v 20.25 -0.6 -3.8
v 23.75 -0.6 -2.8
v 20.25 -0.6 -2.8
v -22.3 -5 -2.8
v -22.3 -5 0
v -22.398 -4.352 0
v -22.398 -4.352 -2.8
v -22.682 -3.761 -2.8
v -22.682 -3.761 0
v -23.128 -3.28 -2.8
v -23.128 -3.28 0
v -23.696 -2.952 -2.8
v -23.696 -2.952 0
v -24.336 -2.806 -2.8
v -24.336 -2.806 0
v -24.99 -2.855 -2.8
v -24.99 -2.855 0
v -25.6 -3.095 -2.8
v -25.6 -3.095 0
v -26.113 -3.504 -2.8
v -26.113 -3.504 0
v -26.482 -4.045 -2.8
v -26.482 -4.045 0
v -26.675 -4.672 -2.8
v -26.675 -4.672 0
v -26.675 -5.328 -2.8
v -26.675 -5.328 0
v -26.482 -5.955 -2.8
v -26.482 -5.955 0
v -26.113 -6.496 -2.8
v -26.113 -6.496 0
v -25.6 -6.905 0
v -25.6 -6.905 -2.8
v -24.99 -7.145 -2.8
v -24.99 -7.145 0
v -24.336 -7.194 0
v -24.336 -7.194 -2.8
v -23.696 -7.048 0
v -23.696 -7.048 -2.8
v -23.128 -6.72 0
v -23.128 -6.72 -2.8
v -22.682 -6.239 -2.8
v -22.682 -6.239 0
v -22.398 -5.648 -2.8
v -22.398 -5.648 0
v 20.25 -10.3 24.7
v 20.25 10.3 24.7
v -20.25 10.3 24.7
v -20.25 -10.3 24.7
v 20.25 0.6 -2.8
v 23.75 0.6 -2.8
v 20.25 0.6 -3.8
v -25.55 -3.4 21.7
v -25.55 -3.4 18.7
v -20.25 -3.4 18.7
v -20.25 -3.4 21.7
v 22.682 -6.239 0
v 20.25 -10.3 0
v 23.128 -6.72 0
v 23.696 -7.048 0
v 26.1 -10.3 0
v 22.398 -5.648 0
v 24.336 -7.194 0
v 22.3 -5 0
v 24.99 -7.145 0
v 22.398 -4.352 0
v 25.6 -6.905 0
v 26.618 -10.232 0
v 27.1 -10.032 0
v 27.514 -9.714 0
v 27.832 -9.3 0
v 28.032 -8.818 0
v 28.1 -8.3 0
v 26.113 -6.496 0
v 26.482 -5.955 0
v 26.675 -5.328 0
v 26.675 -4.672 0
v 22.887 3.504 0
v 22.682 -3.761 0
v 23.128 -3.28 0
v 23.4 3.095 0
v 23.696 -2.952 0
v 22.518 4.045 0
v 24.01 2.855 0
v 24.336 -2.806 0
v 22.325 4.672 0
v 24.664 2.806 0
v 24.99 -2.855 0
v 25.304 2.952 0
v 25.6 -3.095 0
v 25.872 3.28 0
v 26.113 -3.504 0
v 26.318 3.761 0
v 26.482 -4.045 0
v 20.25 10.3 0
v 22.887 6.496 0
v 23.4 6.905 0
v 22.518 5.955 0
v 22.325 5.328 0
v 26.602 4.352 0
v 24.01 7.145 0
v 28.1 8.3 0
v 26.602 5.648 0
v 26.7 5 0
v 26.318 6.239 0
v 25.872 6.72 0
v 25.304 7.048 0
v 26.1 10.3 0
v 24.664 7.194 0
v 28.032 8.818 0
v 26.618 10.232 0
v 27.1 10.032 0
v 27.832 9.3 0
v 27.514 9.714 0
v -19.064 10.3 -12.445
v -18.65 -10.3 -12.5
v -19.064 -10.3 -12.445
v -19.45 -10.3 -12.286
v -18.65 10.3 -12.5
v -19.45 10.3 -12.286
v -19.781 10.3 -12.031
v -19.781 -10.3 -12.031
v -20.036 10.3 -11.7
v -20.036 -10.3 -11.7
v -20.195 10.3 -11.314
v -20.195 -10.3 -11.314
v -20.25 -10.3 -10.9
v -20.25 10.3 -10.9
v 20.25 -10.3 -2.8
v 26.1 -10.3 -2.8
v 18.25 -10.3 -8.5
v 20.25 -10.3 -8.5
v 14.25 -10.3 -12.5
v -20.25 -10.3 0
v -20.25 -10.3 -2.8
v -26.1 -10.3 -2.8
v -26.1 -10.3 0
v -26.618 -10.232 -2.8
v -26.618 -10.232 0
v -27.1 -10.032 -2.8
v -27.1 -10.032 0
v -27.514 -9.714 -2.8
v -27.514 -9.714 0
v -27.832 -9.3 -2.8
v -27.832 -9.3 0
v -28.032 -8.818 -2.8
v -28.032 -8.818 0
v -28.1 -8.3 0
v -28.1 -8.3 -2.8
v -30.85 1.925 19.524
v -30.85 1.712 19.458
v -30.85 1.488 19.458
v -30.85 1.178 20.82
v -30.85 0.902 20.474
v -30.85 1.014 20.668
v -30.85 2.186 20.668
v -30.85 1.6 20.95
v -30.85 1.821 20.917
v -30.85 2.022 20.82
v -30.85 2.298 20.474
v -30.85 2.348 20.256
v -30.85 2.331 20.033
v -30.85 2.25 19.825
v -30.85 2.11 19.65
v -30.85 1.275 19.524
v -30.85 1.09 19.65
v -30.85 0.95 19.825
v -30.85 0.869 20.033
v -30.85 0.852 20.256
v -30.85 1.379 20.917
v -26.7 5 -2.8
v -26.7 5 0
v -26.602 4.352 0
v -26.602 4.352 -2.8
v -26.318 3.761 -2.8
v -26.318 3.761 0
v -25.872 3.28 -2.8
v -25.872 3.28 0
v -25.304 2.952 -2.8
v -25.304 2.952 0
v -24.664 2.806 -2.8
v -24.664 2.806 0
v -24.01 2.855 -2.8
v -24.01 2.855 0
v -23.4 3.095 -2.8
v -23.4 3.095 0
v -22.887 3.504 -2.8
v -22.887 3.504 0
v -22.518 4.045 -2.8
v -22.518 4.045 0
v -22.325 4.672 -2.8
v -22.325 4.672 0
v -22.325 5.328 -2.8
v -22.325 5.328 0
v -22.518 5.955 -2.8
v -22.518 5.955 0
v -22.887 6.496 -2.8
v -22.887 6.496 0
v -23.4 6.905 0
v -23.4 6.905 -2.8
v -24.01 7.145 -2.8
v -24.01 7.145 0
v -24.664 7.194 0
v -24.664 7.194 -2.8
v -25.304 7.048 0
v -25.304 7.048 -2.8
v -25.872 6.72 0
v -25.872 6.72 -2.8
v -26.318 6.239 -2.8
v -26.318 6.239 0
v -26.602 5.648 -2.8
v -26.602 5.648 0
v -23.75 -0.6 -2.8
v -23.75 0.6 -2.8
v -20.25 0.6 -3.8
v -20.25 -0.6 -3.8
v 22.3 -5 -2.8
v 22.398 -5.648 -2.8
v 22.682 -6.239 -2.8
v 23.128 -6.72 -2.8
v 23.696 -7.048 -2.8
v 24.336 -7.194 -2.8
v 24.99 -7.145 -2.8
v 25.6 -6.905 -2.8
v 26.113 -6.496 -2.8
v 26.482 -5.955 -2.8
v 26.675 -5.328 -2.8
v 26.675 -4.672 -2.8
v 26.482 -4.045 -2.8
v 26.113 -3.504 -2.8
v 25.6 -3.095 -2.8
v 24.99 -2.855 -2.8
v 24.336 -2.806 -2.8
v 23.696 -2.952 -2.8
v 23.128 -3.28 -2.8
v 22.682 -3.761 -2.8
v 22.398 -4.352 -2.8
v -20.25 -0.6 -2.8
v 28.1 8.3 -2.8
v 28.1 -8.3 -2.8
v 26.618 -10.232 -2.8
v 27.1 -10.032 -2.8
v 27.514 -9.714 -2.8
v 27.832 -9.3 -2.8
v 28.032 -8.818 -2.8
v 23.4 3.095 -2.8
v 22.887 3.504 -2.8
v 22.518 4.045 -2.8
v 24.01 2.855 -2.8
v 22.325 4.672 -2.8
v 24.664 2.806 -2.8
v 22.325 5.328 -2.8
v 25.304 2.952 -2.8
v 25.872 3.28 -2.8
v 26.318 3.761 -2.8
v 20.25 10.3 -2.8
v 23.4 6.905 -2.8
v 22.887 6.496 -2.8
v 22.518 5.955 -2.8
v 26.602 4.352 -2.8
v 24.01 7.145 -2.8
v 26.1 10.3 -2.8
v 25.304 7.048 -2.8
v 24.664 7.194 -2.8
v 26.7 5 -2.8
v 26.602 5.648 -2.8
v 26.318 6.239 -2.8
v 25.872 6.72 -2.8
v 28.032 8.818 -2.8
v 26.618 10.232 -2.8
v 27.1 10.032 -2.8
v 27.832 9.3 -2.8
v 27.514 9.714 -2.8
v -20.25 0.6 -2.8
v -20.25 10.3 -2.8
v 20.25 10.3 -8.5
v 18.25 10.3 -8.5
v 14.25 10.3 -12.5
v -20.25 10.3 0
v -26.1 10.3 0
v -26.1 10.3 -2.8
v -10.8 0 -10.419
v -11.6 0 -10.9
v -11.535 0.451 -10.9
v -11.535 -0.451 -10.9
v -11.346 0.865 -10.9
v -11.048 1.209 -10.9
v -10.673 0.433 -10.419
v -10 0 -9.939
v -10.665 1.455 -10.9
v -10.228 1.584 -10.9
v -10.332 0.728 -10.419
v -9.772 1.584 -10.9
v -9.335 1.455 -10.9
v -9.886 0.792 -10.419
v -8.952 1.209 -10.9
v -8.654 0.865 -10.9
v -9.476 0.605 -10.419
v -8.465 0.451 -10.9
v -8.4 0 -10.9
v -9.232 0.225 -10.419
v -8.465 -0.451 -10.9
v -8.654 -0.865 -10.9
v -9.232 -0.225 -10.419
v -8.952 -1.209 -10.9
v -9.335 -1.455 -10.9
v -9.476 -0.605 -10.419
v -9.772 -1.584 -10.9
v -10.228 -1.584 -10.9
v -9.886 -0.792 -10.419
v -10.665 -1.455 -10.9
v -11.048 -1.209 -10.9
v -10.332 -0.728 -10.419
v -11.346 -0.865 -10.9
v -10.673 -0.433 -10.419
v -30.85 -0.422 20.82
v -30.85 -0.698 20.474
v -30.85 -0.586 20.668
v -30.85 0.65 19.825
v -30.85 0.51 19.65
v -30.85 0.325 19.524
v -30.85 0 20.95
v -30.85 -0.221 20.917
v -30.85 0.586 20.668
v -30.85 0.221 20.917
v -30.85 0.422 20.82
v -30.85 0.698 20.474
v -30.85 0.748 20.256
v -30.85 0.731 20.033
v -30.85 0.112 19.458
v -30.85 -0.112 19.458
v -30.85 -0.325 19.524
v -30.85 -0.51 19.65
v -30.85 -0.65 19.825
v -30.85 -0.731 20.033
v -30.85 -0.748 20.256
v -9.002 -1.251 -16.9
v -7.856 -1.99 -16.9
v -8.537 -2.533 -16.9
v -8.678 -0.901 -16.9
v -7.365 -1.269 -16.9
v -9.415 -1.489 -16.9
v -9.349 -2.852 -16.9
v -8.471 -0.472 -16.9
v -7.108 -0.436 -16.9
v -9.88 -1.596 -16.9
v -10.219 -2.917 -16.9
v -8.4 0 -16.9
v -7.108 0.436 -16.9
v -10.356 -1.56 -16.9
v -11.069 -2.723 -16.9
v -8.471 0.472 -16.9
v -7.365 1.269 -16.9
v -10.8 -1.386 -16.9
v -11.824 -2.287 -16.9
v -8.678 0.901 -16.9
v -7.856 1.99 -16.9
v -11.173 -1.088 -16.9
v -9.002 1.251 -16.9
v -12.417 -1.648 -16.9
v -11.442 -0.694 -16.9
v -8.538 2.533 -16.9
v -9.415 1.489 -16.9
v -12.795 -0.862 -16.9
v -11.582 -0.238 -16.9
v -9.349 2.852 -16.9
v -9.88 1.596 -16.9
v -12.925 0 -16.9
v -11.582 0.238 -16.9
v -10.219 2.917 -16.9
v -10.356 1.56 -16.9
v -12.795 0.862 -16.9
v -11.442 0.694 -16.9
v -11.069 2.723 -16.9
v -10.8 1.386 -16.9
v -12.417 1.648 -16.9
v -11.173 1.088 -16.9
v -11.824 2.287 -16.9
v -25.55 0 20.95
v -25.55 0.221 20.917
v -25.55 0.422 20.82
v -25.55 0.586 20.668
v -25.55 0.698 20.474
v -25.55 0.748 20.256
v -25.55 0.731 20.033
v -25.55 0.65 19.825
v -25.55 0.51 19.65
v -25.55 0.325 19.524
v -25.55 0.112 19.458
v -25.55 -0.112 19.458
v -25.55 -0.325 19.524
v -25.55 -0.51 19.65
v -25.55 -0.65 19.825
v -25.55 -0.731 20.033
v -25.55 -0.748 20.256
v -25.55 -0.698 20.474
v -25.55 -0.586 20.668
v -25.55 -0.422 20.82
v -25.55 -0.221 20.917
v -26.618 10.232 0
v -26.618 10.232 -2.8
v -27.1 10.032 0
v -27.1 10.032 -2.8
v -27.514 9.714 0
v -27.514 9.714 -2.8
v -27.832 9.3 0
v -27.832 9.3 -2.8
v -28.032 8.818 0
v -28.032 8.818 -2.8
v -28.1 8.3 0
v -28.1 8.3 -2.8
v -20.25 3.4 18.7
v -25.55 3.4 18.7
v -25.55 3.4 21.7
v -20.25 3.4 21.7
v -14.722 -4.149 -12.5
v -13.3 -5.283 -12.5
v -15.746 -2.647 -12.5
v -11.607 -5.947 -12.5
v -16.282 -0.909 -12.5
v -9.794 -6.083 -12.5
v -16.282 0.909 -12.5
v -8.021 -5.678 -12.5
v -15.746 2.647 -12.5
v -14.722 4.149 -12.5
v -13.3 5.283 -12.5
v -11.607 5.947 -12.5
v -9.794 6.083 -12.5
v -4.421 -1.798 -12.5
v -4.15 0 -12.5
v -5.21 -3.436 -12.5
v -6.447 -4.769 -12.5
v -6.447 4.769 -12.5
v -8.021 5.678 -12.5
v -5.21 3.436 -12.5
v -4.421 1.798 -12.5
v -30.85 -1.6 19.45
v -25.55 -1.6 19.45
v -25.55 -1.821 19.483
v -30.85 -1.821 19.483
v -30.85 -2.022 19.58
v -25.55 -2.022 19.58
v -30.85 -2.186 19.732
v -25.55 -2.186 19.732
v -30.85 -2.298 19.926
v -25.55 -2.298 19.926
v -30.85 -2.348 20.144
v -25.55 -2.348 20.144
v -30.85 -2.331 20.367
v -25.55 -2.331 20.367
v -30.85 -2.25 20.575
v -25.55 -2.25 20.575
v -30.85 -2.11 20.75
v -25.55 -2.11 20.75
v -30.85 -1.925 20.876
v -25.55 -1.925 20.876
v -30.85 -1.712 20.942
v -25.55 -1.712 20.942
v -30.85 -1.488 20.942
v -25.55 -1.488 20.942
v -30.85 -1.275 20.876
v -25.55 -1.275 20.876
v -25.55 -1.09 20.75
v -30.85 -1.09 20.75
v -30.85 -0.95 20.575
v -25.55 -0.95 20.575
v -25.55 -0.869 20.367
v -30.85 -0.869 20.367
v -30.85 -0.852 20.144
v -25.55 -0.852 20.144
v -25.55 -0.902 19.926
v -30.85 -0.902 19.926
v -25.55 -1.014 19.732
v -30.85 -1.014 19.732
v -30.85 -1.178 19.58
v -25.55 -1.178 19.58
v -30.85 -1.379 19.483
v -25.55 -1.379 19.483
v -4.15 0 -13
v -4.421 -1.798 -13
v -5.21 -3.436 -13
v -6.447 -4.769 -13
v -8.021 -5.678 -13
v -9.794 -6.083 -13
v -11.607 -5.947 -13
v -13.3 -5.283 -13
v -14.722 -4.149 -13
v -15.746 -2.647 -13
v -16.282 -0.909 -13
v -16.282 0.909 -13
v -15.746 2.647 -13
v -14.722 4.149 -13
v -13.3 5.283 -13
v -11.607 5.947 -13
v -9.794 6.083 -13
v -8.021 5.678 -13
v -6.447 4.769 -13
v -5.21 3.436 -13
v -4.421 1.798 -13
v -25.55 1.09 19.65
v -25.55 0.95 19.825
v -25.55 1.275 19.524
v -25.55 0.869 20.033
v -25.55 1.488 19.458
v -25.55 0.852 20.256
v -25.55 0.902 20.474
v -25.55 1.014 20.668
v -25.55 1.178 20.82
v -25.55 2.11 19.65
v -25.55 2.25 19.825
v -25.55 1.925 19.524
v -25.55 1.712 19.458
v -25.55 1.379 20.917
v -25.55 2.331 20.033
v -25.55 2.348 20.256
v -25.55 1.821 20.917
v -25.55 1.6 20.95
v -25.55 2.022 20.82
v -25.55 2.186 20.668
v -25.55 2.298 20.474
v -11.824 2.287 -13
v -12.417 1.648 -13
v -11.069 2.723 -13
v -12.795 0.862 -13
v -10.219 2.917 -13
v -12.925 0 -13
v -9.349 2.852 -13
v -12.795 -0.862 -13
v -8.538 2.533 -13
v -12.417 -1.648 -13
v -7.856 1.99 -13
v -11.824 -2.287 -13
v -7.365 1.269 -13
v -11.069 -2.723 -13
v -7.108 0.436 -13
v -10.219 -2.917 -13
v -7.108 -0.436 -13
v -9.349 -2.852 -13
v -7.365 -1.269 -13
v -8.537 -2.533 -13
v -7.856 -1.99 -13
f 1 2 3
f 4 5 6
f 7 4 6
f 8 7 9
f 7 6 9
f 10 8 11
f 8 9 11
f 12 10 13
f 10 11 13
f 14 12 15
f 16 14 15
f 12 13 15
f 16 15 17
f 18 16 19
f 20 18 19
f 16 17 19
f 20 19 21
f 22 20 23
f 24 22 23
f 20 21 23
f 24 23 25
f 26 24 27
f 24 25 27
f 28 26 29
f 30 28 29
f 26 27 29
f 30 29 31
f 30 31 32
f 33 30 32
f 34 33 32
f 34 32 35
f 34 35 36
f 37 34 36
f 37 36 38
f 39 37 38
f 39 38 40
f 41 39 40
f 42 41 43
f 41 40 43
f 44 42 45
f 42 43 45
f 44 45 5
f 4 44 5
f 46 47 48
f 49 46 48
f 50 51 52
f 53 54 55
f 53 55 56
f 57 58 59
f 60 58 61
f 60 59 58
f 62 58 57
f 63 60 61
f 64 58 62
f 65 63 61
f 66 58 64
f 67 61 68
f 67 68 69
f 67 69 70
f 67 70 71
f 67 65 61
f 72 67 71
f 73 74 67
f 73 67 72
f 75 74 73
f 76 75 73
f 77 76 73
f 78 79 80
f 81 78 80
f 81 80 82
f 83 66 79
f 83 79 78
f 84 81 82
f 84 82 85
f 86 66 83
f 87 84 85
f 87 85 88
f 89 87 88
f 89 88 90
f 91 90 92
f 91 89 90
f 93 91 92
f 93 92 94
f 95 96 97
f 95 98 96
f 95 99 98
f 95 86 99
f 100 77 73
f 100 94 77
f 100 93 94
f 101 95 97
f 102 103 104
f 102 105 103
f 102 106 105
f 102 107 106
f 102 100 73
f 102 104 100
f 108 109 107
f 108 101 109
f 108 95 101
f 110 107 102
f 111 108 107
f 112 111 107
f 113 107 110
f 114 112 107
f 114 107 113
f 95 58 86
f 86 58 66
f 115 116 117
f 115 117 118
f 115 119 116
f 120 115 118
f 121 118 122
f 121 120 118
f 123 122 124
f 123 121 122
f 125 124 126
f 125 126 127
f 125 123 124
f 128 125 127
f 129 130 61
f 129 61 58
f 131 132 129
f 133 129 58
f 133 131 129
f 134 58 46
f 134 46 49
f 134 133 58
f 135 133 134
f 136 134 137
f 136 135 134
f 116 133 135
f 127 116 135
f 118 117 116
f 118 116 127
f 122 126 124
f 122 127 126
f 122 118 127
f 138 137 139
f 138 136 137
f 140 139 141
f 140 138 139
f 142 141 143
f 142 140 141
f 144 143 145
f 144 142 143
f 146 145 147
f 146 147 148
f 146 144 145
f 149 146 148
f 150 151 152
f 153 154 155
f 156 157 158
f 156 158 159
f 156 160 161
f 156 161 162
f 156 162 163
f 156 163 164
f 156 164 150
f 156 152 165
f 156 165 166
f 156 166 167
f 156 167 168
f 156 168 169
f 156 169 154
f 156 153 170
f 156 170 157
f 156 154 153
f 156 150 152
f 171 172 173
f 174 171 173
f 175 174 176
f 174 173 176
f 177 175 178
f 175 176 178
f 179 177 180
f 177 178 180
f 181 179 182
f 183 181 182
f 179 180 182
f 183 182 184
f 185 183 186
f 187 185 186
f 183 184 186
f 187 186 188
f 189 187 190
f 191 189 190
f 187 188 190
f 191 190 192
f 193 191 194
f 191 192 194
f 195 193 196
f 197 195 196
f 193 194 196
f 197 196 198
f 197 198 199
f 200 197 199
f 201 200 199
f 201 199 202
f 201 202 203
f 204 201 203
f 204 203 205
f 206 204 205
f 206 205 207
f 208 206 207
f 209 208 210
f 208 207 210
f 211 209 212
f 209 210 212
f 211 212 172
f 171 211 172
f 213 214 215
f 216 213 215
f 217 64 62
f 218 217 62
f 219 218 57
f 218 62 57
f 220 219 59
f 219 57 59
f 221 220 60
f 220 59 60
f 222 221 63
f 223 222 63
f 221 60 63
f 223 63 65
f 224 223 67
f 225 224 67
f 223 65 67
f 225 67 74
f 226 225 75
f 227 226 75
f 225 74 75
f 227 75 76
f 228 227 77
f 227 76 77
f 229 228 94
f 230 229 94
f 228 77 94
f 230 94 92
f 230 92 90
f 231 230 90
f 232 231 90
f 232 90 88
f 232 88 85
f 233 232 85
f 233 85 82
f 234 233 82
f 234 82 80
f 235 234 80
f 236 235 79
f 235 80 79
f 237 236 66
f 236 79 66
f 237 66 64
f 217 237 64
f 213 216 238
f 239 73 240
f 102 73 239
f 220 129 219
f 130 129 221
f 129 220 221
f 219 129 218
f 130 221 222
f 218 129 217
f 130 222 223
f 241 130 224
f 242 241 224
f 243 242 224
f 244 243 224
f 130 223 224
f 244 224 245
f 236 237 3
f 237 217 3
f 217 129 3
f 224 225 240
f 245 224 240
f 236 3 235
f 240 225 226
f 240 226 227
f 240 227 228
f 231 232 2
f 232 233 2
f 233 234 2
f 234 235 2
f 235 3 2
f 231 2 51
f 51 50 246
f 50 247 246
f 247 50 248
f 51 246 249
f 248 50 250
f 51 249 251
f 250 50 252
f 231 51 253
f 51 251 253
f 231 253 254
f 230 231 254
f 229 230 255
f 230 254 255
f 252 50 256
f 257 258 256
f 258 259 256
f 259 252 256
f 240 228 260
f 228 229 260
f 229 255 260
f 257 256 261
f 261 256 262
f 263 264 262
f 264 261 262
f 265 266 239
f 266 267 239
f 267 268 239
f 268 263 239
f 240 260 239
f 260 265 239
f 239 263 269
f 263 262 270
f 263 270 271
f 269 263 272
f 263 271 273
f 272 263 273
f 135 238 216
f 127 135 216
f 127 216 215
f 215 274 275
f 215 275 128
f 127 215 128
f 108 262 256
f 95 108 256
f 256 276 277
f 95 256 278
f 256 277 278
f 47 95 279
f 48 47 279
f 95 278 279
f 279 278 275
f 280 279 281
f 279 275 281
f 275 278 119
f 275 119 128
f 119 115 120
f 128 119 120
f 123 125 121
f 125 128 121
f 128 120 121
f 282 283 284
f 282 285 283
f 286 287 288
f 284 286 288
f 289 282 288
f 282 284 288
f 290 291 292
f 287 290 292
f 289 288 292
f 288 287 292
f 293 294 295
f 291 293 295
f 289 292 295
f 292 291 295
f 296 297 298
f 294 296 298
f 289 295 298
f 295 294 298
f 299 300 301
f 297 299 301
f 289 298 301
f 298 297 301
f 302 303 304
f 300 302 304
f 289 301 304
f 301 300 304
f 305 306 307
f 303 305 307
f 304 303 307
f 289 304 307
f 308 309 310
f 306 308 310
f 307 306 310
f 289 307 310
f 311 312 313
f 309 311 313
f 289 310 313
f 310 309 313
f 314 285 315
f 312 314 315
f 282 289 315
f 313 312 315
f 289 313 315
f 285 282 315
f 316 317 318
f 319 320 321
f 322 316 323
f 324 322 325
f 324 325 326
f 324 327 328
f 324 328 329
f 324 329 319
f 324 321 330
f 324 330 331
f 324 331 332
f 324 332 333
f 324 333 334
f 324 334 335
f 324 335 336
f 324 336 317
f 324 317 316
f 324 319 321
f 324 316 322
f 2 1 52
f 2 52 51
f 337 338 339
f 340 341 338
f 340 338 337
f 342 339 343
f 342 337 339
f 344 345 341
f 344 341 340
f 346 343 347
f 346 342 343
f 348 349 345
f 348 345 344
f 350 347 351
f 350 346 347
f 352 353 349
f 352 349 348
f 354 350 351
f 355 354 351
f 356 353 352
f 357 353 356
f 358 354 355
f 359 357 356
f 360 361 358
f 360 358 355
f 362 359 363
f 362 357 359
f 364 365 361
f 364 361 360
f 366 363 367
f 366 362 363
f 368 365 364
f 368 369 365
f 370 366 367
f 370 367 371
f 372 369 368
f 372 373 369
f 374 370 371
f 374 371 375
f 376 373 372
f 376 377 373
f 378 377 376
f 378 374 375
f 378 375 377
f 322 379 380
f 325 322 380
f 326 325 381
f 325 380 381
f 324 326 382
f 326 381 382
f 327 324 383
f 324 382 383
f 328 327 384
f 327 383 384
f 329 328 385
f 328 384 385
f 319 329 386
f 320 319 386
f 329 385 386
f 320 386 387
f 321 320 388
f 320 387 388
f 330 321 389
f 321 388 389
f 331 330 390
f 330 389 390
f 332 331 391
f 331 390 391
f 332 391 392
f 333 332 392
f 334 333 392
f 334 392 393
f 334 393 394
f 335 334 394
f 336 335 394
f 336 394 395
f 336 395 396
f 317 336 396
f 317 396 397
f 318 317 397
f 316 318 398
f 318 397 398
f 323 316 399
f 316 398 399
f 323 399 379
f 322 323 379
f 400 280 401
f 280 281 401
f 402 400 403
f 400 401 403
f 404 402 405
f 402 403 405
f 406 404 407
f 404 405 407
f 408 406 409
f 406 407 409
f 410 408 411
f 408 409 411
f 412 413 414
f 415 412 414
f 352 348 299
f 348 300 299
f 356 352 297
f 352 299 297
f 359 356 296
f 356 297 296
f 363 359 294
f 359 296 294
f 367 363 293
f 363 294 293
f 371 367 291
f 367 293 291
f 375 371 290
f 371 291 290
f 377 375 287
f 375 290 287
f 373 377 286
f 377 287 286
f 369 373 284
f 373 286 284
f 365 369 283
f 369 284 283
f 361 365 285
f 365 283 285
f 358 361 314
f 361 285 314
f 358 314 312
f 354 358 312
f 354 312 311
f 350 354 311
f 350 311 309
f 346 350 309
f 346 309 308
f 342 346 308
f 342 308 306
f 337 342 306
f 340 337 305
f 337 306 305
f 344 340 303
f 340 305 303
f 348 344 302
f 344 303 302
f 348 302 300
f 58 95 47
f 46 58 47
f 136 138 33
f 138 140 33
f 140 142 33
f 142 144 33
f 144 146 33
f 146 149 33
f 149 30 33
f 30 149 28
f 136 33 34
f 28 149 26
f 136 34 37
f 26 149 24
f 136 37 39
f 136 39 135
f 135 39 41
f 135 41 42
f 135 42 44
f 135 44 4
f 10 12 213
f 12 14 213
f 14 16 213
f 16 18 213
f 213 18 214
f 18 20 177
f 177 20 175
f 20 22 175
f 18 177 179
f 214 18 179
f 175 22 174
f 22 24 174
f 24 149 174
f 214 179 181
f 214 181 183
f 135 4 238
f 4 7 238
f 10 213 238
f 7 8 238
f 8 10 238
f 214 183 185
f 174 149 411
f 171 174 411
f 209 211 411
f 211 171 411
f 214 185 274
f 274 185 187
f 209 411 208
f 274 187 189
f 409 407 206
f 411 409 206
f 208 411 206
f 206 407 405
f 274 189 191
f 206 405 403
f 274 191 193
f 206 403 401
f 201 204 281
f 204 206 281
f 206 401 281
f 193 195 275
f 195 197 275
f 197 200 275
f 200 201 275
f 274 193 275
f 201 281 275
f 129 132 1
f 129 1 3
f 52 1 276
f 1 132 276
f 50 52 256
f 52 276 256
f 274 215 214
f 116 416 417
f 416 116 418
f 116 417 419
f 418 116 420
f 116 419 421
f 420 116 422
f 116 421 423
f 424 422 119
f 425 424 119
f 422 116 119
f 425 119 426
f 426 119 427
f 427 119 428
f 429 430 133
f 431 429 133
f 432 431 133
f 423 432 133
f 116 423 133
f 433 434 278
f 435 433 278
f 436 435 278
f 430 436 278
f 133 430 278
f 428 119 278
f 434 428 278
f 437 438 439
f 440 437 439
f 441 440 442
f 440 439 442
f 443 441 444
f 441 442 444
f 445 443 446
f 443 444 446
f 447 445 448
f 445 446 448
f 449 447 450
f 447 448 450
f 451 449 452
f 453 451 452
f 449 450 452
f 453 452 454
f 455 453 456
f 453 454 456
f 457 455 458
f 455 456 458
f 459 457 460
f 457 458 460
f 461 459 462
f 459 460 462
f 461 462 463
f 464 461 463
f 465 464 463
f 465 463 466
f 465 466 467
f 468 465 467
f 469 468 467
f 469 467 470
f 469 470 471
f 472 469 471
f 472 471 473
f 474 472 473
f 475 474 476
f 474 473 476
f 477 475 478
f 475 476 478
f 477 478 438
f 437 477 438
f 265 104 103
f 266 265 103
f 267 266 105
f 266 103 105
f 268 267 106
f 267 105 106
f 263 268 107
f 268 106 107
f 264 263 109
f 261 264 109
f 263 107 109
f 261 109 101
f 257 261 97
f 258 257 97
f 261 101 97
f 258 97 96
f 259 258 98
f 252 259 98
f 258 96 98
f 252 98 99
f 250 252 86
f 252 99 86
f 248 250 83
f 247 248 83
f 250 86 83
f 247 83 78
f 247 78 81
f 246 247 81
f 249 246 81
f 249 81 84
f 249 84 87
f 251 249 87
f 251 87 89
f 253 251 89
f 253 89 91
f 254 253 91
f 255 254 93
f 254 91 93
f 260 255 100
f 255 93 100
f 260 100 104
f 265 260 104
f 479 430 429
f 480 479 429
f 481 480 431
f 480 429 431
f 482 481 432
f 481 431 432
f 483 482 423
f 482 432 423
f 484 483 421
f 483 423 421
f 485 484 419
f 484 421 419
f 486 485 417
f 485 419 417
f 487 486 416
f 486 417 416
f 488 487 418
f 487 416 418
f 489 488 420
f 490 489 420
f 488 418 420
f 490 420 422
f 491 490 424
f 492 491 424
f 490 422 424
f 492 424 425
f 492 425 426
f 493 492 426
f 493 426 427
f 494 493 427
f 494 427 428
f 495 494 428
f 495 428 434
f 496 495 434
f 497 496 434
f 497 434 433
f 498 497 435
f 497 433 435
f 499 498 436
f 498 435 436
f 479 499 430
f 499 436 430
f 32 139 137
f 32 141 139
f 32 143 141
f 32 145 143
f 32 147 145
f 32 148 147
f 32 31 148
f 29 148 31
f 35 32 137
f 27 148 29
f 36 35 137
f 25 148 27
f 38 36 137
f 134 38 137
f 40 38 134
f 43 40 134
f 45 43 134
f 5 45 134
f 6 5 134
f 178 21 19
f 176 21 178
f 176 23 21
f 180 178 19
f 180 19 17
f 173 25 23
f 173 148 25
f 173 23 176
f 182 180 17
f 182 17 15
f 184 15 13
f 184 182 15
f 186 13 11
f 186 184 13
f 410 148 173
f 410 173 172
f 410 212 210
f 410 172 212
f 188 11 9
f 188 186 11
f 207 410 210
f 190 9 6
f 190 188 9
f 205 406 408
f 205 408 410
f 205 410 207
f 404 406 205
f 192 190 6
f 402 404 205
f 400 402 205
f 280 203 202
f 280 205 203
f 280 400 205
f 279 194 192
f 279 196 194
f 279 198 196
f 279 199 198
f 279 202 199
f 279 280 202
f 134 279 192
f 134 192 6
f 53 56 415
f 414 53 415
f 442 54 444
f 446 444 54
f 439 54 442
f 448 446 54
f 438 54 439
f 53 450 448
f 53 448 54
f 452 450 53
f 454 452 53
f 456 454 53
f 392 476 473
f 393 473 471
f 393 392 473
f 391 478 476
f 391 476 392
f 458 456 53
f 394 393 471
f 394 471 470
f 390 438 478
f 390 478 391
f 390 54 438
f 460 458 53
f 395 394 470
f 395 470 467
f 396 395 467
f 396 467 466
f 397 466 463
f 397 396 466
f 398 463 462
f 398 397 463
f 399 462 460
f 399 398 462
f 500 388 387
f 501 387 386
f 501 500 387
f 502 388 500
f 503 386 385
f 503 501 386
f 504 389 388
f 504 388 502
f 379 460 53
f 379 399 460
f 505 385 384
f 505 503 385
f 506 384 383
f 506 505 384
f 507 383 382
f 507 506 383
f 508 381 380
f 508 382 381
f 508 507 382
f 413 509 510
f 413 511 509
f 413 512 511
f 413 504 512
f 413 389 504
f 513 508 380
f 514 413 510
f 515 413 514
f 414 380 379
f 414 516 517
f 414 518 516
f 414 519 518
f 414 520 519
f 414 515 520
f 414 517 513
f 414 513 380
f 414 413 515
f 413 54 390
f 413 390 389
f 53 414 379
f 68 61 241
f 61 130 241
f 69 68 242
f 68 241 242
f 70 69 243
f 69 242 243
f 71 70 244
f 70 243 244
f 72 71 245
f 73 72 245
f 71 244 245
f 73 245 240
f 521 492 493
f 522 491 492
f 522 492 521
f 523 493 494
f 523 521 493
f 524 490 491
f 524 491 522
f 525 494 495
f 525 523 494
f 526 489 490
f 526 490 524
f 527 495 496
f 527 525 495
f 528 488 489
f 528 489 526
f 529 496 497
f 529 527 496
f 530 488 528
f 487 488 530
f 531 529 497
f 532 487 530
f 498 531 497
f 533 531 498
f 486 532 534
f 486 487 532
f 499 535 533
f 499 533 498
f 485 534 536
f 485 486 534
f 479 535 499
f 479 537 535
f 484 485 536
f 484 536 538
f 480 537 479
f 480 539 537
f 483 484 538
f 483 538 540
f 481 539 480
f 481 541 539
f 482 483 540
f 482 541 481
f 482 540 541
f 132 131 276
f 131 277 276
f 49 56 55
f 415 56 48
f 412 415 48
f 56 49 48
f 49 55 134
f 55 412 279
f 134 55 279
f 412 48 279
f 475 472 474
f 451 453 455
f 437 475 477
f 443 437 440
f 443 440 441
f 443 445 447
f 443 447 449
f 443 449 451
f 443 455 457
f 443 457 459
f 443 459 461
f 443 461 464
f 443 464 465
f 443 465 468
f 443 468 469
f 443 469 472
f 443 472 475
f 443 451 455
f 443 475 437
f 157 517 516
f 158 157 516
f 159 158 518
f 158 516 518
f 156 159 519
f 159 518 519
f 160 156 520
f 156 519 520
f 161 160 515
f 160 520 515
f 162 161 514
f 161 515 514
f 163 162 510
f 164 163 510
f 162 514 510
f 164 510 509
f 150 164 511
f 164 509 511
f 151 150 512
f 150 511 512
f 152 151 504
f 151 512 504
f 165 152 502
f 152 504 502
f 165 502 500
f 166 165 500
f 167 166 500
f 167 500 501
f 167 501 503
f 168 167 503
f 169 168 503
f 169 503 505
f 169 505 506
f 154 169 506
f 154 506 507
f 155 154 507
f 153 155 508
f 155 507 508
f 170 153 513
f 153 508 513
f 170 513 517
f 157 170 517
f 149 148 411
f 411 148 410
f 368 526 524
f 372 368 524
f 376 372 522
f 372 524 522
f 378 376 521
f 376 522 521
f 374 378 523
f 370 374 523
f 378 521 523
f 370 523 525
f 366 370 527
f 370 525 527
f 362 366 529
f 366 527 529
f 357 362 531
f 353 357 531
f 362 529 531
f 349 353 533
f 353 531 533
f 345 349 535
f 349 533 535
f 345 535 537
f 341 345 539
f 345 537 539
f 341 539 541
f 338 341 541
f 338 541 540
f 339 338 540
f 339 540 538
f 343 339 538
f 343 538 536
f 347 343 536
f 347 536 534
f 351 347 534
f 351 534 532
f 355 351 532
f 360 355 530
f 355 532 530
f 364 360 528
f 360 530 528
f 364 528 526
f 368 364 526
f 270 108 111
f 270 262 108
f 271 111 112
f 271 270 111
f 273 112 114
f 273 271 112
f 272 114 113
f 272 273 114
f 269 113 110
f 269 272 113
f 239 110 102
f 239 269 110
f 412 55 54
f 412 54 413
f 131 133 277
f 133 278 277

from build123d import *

# Parameters (mm, degrees)
BOSS_EXTRU_1_DEPTH   = 10.3
ESQUISSE3_W          = 7.85
ESQUISSE3_H          = 20.6
ESQUISSE3_R          = 2.2
BOSS_EXTRU_2_DEPTH   = 2.8
BOSS_EXTRU_3_DEPTH   = 0.6
ESQUISSE8_R          = 6.1
BOSS_EXTRU_7_DEPTH   = 0.5
ESQUISSE5_R          = 2.925
BOSS_EXTRU_4_DEPTH   = 3.9
CONG_1_R             = 2
ESQUISSE6_W          = 3
ESQUISSE6_H          = 6.8
BOSS_EXTRU_5_DEPTH   = 5.3
ESQUISSE7_R          = 0.75
BOSS_EXTRU_6_DEPTH   = 5.3
D_GAGEMENT_M31_D     = 3.2
D_GAGEMENT_M31_DEPTH = 6
D_GAGEMENT_M31_TIP   = 0.96137699
CONG_2_R             = 1.6


with BuildPart() as part:
    # Esquisse1 → Boss.-Extru.1 (new, symmetric)
    with BuildSketch(Plane(origin=(0, 0, 0), x_dir=(1, 0, 0), z_dir=(0, 1, 0))):
        Polygon((-20.25, 12.5), (14.25, 12.5), (18.25, 8.5), (20.25, 8.5), (20.25, -24.7), (-20.25, -24.7), align=None)
    extrude(amount=BOSS_EXTRU_1_DEPTH, both=True)

    # Esquisse3 → Boss.-Extru.2 (add)
    # profile 1 of 2: a face of its own
    with BuildSketch(Plane.XY):
        with Locations((24.175, 0)):
            Rectangle(ESQUISSE3_W, ESQUISSE3_H)
        with Locations((24.5, 5)):
            Circle(ESQUISSE3_R, mode=Mode.SUBTRACT)
        with Locations(Location((24.5, -5, 0), (0, 0, 180))):
            Circle(ESQUISSE3_R, mode=Mode.SUBTRACT)
    # profile 2 of 2: a face of its own
    with BuildSketch(Plane.XY):
        with Locations((-24.175, 0)):
            Rectangle(ESQUISSE3_W, ESQUISSE3_H)
        with Locations(Location((-24.5, 5, 0), (0, 0, 180))):
            Circle(ESQUISSE3_R, mode=Mode.SUBTRACT)
        with Locations((-24.5, -5)):
            Circle(ESQUISSE3_R, mode=Mode.SUBTRACT)
    extrude(amount=-BOSS_EXTRU_2_DEPTH)

    # Esquisse4 → Boss.-Extru.3 (add, symmetric)
    with BuildSketch(Plane(origin=(0, 0, 0), x_dir=(1, 0, 0), z_dir=(0, 1, 0))):
        Polygon((20.25, 2.8), (20.25, 3.8), (23.75, 2.8), align=None)
        Polygon((-23.75, 2.8), (-20.25, 3.8), (-20.25, 2.8), align=None)
    extrude(amount=BOSS_EXTRU_3_DEPTH, both=True)

    # Esquisse8 → Boss.-Extru.7 (add)
    with BuildSketch(Plane(origin=(0, 0, -12.5), x_dir=(-1, 0, 0), z_dir=(0, 0, -1))):
        with Locations(Location((10.25, 0, 0), (0, 0, 180))):
            Circle(ESQUISSE8_R)
    extrude(amount=BOSS_EXTRU_7_DEPTH)

    # Esquisse5 → Boss.-Extru.4 (add)
    with BuildSketch(Plane(origin=(0, 0, -13), x_dir=(-1, 0, 0), z_dir=(0, 0, -1))):
        with Locations((10, 0)):
            Circle(ESQUISSE5_R)
    extrude(amount=BOSS_EXTRU_4_DEPTH)

    # Congé1
    cong_1_edges = [part.edges().sort_by_distance(p)[0] for p in [
        (28.1, 10.3, -1.4),
        (28.1, -10.3, -1.4),
        (-28.1, -10.3, -1.4),
        (-28.1, 10.3, -1.4),
    ]]
    fillet(cong_1_edges, radius=CONG_1_R)

    # Esquisse6 → Boss.-Extru.5 (add)
    with BuildSketch(Plane.ZY.offset(20.25)):
        with Locations((20.2, 0)):
            Rectangle(ESQUISSE6_W, ESQUISSE6_H)
    extrude(amount=BOSS_EXTRU_5_DEPTH)

    # Esquisse7 → Boss.-Extru.6 (add)
    with BuildSketch(Plane.ZY.offset(25.55)):
        with Locations((20.2, 0)):
            Circle(ESQUISSE7_R)
        with Locations((20.2, 1.6)):
            Circle(ESQUISSE7_R)
        with Locations(Location((20.2, -1.6, 0), (0, 0, 180))):
            Circle(ESQUISSE7_R)
    extrude(amount=BOSS_EXTRU_6_DEPTH)

    # Dégagement M31
    with Locations(Plane(origin=(0, 0, -16.9), x_dir=(-1, 0, 0), z_dir=(0, 0, -1))):
        with Locations((10, 0)):
            Hole(D_GAGEMENT_M31_D / 2, depth=D_GAGEMENT_M31_DEPTH)
            with Locations((0, 0, -(D_GAGEMENT_M31_DEPTH + D_GAGEMENT_M31_TIP / 2))):  # 118° drill point
                Cone(0, D_GAGEMENT_M31_D / 2, D_GAGEMENT_M31_TIP, mode=Mode.SUBTRACT)

    # Congé2
    cong_2_edges = [part.edges().sort_by_distance(p)[0] for p in [
        (-20.25, 0, -12.5),
    ]]
    fillet(cong_2_edges, radius=CONG_2_R)


solid = part.part
